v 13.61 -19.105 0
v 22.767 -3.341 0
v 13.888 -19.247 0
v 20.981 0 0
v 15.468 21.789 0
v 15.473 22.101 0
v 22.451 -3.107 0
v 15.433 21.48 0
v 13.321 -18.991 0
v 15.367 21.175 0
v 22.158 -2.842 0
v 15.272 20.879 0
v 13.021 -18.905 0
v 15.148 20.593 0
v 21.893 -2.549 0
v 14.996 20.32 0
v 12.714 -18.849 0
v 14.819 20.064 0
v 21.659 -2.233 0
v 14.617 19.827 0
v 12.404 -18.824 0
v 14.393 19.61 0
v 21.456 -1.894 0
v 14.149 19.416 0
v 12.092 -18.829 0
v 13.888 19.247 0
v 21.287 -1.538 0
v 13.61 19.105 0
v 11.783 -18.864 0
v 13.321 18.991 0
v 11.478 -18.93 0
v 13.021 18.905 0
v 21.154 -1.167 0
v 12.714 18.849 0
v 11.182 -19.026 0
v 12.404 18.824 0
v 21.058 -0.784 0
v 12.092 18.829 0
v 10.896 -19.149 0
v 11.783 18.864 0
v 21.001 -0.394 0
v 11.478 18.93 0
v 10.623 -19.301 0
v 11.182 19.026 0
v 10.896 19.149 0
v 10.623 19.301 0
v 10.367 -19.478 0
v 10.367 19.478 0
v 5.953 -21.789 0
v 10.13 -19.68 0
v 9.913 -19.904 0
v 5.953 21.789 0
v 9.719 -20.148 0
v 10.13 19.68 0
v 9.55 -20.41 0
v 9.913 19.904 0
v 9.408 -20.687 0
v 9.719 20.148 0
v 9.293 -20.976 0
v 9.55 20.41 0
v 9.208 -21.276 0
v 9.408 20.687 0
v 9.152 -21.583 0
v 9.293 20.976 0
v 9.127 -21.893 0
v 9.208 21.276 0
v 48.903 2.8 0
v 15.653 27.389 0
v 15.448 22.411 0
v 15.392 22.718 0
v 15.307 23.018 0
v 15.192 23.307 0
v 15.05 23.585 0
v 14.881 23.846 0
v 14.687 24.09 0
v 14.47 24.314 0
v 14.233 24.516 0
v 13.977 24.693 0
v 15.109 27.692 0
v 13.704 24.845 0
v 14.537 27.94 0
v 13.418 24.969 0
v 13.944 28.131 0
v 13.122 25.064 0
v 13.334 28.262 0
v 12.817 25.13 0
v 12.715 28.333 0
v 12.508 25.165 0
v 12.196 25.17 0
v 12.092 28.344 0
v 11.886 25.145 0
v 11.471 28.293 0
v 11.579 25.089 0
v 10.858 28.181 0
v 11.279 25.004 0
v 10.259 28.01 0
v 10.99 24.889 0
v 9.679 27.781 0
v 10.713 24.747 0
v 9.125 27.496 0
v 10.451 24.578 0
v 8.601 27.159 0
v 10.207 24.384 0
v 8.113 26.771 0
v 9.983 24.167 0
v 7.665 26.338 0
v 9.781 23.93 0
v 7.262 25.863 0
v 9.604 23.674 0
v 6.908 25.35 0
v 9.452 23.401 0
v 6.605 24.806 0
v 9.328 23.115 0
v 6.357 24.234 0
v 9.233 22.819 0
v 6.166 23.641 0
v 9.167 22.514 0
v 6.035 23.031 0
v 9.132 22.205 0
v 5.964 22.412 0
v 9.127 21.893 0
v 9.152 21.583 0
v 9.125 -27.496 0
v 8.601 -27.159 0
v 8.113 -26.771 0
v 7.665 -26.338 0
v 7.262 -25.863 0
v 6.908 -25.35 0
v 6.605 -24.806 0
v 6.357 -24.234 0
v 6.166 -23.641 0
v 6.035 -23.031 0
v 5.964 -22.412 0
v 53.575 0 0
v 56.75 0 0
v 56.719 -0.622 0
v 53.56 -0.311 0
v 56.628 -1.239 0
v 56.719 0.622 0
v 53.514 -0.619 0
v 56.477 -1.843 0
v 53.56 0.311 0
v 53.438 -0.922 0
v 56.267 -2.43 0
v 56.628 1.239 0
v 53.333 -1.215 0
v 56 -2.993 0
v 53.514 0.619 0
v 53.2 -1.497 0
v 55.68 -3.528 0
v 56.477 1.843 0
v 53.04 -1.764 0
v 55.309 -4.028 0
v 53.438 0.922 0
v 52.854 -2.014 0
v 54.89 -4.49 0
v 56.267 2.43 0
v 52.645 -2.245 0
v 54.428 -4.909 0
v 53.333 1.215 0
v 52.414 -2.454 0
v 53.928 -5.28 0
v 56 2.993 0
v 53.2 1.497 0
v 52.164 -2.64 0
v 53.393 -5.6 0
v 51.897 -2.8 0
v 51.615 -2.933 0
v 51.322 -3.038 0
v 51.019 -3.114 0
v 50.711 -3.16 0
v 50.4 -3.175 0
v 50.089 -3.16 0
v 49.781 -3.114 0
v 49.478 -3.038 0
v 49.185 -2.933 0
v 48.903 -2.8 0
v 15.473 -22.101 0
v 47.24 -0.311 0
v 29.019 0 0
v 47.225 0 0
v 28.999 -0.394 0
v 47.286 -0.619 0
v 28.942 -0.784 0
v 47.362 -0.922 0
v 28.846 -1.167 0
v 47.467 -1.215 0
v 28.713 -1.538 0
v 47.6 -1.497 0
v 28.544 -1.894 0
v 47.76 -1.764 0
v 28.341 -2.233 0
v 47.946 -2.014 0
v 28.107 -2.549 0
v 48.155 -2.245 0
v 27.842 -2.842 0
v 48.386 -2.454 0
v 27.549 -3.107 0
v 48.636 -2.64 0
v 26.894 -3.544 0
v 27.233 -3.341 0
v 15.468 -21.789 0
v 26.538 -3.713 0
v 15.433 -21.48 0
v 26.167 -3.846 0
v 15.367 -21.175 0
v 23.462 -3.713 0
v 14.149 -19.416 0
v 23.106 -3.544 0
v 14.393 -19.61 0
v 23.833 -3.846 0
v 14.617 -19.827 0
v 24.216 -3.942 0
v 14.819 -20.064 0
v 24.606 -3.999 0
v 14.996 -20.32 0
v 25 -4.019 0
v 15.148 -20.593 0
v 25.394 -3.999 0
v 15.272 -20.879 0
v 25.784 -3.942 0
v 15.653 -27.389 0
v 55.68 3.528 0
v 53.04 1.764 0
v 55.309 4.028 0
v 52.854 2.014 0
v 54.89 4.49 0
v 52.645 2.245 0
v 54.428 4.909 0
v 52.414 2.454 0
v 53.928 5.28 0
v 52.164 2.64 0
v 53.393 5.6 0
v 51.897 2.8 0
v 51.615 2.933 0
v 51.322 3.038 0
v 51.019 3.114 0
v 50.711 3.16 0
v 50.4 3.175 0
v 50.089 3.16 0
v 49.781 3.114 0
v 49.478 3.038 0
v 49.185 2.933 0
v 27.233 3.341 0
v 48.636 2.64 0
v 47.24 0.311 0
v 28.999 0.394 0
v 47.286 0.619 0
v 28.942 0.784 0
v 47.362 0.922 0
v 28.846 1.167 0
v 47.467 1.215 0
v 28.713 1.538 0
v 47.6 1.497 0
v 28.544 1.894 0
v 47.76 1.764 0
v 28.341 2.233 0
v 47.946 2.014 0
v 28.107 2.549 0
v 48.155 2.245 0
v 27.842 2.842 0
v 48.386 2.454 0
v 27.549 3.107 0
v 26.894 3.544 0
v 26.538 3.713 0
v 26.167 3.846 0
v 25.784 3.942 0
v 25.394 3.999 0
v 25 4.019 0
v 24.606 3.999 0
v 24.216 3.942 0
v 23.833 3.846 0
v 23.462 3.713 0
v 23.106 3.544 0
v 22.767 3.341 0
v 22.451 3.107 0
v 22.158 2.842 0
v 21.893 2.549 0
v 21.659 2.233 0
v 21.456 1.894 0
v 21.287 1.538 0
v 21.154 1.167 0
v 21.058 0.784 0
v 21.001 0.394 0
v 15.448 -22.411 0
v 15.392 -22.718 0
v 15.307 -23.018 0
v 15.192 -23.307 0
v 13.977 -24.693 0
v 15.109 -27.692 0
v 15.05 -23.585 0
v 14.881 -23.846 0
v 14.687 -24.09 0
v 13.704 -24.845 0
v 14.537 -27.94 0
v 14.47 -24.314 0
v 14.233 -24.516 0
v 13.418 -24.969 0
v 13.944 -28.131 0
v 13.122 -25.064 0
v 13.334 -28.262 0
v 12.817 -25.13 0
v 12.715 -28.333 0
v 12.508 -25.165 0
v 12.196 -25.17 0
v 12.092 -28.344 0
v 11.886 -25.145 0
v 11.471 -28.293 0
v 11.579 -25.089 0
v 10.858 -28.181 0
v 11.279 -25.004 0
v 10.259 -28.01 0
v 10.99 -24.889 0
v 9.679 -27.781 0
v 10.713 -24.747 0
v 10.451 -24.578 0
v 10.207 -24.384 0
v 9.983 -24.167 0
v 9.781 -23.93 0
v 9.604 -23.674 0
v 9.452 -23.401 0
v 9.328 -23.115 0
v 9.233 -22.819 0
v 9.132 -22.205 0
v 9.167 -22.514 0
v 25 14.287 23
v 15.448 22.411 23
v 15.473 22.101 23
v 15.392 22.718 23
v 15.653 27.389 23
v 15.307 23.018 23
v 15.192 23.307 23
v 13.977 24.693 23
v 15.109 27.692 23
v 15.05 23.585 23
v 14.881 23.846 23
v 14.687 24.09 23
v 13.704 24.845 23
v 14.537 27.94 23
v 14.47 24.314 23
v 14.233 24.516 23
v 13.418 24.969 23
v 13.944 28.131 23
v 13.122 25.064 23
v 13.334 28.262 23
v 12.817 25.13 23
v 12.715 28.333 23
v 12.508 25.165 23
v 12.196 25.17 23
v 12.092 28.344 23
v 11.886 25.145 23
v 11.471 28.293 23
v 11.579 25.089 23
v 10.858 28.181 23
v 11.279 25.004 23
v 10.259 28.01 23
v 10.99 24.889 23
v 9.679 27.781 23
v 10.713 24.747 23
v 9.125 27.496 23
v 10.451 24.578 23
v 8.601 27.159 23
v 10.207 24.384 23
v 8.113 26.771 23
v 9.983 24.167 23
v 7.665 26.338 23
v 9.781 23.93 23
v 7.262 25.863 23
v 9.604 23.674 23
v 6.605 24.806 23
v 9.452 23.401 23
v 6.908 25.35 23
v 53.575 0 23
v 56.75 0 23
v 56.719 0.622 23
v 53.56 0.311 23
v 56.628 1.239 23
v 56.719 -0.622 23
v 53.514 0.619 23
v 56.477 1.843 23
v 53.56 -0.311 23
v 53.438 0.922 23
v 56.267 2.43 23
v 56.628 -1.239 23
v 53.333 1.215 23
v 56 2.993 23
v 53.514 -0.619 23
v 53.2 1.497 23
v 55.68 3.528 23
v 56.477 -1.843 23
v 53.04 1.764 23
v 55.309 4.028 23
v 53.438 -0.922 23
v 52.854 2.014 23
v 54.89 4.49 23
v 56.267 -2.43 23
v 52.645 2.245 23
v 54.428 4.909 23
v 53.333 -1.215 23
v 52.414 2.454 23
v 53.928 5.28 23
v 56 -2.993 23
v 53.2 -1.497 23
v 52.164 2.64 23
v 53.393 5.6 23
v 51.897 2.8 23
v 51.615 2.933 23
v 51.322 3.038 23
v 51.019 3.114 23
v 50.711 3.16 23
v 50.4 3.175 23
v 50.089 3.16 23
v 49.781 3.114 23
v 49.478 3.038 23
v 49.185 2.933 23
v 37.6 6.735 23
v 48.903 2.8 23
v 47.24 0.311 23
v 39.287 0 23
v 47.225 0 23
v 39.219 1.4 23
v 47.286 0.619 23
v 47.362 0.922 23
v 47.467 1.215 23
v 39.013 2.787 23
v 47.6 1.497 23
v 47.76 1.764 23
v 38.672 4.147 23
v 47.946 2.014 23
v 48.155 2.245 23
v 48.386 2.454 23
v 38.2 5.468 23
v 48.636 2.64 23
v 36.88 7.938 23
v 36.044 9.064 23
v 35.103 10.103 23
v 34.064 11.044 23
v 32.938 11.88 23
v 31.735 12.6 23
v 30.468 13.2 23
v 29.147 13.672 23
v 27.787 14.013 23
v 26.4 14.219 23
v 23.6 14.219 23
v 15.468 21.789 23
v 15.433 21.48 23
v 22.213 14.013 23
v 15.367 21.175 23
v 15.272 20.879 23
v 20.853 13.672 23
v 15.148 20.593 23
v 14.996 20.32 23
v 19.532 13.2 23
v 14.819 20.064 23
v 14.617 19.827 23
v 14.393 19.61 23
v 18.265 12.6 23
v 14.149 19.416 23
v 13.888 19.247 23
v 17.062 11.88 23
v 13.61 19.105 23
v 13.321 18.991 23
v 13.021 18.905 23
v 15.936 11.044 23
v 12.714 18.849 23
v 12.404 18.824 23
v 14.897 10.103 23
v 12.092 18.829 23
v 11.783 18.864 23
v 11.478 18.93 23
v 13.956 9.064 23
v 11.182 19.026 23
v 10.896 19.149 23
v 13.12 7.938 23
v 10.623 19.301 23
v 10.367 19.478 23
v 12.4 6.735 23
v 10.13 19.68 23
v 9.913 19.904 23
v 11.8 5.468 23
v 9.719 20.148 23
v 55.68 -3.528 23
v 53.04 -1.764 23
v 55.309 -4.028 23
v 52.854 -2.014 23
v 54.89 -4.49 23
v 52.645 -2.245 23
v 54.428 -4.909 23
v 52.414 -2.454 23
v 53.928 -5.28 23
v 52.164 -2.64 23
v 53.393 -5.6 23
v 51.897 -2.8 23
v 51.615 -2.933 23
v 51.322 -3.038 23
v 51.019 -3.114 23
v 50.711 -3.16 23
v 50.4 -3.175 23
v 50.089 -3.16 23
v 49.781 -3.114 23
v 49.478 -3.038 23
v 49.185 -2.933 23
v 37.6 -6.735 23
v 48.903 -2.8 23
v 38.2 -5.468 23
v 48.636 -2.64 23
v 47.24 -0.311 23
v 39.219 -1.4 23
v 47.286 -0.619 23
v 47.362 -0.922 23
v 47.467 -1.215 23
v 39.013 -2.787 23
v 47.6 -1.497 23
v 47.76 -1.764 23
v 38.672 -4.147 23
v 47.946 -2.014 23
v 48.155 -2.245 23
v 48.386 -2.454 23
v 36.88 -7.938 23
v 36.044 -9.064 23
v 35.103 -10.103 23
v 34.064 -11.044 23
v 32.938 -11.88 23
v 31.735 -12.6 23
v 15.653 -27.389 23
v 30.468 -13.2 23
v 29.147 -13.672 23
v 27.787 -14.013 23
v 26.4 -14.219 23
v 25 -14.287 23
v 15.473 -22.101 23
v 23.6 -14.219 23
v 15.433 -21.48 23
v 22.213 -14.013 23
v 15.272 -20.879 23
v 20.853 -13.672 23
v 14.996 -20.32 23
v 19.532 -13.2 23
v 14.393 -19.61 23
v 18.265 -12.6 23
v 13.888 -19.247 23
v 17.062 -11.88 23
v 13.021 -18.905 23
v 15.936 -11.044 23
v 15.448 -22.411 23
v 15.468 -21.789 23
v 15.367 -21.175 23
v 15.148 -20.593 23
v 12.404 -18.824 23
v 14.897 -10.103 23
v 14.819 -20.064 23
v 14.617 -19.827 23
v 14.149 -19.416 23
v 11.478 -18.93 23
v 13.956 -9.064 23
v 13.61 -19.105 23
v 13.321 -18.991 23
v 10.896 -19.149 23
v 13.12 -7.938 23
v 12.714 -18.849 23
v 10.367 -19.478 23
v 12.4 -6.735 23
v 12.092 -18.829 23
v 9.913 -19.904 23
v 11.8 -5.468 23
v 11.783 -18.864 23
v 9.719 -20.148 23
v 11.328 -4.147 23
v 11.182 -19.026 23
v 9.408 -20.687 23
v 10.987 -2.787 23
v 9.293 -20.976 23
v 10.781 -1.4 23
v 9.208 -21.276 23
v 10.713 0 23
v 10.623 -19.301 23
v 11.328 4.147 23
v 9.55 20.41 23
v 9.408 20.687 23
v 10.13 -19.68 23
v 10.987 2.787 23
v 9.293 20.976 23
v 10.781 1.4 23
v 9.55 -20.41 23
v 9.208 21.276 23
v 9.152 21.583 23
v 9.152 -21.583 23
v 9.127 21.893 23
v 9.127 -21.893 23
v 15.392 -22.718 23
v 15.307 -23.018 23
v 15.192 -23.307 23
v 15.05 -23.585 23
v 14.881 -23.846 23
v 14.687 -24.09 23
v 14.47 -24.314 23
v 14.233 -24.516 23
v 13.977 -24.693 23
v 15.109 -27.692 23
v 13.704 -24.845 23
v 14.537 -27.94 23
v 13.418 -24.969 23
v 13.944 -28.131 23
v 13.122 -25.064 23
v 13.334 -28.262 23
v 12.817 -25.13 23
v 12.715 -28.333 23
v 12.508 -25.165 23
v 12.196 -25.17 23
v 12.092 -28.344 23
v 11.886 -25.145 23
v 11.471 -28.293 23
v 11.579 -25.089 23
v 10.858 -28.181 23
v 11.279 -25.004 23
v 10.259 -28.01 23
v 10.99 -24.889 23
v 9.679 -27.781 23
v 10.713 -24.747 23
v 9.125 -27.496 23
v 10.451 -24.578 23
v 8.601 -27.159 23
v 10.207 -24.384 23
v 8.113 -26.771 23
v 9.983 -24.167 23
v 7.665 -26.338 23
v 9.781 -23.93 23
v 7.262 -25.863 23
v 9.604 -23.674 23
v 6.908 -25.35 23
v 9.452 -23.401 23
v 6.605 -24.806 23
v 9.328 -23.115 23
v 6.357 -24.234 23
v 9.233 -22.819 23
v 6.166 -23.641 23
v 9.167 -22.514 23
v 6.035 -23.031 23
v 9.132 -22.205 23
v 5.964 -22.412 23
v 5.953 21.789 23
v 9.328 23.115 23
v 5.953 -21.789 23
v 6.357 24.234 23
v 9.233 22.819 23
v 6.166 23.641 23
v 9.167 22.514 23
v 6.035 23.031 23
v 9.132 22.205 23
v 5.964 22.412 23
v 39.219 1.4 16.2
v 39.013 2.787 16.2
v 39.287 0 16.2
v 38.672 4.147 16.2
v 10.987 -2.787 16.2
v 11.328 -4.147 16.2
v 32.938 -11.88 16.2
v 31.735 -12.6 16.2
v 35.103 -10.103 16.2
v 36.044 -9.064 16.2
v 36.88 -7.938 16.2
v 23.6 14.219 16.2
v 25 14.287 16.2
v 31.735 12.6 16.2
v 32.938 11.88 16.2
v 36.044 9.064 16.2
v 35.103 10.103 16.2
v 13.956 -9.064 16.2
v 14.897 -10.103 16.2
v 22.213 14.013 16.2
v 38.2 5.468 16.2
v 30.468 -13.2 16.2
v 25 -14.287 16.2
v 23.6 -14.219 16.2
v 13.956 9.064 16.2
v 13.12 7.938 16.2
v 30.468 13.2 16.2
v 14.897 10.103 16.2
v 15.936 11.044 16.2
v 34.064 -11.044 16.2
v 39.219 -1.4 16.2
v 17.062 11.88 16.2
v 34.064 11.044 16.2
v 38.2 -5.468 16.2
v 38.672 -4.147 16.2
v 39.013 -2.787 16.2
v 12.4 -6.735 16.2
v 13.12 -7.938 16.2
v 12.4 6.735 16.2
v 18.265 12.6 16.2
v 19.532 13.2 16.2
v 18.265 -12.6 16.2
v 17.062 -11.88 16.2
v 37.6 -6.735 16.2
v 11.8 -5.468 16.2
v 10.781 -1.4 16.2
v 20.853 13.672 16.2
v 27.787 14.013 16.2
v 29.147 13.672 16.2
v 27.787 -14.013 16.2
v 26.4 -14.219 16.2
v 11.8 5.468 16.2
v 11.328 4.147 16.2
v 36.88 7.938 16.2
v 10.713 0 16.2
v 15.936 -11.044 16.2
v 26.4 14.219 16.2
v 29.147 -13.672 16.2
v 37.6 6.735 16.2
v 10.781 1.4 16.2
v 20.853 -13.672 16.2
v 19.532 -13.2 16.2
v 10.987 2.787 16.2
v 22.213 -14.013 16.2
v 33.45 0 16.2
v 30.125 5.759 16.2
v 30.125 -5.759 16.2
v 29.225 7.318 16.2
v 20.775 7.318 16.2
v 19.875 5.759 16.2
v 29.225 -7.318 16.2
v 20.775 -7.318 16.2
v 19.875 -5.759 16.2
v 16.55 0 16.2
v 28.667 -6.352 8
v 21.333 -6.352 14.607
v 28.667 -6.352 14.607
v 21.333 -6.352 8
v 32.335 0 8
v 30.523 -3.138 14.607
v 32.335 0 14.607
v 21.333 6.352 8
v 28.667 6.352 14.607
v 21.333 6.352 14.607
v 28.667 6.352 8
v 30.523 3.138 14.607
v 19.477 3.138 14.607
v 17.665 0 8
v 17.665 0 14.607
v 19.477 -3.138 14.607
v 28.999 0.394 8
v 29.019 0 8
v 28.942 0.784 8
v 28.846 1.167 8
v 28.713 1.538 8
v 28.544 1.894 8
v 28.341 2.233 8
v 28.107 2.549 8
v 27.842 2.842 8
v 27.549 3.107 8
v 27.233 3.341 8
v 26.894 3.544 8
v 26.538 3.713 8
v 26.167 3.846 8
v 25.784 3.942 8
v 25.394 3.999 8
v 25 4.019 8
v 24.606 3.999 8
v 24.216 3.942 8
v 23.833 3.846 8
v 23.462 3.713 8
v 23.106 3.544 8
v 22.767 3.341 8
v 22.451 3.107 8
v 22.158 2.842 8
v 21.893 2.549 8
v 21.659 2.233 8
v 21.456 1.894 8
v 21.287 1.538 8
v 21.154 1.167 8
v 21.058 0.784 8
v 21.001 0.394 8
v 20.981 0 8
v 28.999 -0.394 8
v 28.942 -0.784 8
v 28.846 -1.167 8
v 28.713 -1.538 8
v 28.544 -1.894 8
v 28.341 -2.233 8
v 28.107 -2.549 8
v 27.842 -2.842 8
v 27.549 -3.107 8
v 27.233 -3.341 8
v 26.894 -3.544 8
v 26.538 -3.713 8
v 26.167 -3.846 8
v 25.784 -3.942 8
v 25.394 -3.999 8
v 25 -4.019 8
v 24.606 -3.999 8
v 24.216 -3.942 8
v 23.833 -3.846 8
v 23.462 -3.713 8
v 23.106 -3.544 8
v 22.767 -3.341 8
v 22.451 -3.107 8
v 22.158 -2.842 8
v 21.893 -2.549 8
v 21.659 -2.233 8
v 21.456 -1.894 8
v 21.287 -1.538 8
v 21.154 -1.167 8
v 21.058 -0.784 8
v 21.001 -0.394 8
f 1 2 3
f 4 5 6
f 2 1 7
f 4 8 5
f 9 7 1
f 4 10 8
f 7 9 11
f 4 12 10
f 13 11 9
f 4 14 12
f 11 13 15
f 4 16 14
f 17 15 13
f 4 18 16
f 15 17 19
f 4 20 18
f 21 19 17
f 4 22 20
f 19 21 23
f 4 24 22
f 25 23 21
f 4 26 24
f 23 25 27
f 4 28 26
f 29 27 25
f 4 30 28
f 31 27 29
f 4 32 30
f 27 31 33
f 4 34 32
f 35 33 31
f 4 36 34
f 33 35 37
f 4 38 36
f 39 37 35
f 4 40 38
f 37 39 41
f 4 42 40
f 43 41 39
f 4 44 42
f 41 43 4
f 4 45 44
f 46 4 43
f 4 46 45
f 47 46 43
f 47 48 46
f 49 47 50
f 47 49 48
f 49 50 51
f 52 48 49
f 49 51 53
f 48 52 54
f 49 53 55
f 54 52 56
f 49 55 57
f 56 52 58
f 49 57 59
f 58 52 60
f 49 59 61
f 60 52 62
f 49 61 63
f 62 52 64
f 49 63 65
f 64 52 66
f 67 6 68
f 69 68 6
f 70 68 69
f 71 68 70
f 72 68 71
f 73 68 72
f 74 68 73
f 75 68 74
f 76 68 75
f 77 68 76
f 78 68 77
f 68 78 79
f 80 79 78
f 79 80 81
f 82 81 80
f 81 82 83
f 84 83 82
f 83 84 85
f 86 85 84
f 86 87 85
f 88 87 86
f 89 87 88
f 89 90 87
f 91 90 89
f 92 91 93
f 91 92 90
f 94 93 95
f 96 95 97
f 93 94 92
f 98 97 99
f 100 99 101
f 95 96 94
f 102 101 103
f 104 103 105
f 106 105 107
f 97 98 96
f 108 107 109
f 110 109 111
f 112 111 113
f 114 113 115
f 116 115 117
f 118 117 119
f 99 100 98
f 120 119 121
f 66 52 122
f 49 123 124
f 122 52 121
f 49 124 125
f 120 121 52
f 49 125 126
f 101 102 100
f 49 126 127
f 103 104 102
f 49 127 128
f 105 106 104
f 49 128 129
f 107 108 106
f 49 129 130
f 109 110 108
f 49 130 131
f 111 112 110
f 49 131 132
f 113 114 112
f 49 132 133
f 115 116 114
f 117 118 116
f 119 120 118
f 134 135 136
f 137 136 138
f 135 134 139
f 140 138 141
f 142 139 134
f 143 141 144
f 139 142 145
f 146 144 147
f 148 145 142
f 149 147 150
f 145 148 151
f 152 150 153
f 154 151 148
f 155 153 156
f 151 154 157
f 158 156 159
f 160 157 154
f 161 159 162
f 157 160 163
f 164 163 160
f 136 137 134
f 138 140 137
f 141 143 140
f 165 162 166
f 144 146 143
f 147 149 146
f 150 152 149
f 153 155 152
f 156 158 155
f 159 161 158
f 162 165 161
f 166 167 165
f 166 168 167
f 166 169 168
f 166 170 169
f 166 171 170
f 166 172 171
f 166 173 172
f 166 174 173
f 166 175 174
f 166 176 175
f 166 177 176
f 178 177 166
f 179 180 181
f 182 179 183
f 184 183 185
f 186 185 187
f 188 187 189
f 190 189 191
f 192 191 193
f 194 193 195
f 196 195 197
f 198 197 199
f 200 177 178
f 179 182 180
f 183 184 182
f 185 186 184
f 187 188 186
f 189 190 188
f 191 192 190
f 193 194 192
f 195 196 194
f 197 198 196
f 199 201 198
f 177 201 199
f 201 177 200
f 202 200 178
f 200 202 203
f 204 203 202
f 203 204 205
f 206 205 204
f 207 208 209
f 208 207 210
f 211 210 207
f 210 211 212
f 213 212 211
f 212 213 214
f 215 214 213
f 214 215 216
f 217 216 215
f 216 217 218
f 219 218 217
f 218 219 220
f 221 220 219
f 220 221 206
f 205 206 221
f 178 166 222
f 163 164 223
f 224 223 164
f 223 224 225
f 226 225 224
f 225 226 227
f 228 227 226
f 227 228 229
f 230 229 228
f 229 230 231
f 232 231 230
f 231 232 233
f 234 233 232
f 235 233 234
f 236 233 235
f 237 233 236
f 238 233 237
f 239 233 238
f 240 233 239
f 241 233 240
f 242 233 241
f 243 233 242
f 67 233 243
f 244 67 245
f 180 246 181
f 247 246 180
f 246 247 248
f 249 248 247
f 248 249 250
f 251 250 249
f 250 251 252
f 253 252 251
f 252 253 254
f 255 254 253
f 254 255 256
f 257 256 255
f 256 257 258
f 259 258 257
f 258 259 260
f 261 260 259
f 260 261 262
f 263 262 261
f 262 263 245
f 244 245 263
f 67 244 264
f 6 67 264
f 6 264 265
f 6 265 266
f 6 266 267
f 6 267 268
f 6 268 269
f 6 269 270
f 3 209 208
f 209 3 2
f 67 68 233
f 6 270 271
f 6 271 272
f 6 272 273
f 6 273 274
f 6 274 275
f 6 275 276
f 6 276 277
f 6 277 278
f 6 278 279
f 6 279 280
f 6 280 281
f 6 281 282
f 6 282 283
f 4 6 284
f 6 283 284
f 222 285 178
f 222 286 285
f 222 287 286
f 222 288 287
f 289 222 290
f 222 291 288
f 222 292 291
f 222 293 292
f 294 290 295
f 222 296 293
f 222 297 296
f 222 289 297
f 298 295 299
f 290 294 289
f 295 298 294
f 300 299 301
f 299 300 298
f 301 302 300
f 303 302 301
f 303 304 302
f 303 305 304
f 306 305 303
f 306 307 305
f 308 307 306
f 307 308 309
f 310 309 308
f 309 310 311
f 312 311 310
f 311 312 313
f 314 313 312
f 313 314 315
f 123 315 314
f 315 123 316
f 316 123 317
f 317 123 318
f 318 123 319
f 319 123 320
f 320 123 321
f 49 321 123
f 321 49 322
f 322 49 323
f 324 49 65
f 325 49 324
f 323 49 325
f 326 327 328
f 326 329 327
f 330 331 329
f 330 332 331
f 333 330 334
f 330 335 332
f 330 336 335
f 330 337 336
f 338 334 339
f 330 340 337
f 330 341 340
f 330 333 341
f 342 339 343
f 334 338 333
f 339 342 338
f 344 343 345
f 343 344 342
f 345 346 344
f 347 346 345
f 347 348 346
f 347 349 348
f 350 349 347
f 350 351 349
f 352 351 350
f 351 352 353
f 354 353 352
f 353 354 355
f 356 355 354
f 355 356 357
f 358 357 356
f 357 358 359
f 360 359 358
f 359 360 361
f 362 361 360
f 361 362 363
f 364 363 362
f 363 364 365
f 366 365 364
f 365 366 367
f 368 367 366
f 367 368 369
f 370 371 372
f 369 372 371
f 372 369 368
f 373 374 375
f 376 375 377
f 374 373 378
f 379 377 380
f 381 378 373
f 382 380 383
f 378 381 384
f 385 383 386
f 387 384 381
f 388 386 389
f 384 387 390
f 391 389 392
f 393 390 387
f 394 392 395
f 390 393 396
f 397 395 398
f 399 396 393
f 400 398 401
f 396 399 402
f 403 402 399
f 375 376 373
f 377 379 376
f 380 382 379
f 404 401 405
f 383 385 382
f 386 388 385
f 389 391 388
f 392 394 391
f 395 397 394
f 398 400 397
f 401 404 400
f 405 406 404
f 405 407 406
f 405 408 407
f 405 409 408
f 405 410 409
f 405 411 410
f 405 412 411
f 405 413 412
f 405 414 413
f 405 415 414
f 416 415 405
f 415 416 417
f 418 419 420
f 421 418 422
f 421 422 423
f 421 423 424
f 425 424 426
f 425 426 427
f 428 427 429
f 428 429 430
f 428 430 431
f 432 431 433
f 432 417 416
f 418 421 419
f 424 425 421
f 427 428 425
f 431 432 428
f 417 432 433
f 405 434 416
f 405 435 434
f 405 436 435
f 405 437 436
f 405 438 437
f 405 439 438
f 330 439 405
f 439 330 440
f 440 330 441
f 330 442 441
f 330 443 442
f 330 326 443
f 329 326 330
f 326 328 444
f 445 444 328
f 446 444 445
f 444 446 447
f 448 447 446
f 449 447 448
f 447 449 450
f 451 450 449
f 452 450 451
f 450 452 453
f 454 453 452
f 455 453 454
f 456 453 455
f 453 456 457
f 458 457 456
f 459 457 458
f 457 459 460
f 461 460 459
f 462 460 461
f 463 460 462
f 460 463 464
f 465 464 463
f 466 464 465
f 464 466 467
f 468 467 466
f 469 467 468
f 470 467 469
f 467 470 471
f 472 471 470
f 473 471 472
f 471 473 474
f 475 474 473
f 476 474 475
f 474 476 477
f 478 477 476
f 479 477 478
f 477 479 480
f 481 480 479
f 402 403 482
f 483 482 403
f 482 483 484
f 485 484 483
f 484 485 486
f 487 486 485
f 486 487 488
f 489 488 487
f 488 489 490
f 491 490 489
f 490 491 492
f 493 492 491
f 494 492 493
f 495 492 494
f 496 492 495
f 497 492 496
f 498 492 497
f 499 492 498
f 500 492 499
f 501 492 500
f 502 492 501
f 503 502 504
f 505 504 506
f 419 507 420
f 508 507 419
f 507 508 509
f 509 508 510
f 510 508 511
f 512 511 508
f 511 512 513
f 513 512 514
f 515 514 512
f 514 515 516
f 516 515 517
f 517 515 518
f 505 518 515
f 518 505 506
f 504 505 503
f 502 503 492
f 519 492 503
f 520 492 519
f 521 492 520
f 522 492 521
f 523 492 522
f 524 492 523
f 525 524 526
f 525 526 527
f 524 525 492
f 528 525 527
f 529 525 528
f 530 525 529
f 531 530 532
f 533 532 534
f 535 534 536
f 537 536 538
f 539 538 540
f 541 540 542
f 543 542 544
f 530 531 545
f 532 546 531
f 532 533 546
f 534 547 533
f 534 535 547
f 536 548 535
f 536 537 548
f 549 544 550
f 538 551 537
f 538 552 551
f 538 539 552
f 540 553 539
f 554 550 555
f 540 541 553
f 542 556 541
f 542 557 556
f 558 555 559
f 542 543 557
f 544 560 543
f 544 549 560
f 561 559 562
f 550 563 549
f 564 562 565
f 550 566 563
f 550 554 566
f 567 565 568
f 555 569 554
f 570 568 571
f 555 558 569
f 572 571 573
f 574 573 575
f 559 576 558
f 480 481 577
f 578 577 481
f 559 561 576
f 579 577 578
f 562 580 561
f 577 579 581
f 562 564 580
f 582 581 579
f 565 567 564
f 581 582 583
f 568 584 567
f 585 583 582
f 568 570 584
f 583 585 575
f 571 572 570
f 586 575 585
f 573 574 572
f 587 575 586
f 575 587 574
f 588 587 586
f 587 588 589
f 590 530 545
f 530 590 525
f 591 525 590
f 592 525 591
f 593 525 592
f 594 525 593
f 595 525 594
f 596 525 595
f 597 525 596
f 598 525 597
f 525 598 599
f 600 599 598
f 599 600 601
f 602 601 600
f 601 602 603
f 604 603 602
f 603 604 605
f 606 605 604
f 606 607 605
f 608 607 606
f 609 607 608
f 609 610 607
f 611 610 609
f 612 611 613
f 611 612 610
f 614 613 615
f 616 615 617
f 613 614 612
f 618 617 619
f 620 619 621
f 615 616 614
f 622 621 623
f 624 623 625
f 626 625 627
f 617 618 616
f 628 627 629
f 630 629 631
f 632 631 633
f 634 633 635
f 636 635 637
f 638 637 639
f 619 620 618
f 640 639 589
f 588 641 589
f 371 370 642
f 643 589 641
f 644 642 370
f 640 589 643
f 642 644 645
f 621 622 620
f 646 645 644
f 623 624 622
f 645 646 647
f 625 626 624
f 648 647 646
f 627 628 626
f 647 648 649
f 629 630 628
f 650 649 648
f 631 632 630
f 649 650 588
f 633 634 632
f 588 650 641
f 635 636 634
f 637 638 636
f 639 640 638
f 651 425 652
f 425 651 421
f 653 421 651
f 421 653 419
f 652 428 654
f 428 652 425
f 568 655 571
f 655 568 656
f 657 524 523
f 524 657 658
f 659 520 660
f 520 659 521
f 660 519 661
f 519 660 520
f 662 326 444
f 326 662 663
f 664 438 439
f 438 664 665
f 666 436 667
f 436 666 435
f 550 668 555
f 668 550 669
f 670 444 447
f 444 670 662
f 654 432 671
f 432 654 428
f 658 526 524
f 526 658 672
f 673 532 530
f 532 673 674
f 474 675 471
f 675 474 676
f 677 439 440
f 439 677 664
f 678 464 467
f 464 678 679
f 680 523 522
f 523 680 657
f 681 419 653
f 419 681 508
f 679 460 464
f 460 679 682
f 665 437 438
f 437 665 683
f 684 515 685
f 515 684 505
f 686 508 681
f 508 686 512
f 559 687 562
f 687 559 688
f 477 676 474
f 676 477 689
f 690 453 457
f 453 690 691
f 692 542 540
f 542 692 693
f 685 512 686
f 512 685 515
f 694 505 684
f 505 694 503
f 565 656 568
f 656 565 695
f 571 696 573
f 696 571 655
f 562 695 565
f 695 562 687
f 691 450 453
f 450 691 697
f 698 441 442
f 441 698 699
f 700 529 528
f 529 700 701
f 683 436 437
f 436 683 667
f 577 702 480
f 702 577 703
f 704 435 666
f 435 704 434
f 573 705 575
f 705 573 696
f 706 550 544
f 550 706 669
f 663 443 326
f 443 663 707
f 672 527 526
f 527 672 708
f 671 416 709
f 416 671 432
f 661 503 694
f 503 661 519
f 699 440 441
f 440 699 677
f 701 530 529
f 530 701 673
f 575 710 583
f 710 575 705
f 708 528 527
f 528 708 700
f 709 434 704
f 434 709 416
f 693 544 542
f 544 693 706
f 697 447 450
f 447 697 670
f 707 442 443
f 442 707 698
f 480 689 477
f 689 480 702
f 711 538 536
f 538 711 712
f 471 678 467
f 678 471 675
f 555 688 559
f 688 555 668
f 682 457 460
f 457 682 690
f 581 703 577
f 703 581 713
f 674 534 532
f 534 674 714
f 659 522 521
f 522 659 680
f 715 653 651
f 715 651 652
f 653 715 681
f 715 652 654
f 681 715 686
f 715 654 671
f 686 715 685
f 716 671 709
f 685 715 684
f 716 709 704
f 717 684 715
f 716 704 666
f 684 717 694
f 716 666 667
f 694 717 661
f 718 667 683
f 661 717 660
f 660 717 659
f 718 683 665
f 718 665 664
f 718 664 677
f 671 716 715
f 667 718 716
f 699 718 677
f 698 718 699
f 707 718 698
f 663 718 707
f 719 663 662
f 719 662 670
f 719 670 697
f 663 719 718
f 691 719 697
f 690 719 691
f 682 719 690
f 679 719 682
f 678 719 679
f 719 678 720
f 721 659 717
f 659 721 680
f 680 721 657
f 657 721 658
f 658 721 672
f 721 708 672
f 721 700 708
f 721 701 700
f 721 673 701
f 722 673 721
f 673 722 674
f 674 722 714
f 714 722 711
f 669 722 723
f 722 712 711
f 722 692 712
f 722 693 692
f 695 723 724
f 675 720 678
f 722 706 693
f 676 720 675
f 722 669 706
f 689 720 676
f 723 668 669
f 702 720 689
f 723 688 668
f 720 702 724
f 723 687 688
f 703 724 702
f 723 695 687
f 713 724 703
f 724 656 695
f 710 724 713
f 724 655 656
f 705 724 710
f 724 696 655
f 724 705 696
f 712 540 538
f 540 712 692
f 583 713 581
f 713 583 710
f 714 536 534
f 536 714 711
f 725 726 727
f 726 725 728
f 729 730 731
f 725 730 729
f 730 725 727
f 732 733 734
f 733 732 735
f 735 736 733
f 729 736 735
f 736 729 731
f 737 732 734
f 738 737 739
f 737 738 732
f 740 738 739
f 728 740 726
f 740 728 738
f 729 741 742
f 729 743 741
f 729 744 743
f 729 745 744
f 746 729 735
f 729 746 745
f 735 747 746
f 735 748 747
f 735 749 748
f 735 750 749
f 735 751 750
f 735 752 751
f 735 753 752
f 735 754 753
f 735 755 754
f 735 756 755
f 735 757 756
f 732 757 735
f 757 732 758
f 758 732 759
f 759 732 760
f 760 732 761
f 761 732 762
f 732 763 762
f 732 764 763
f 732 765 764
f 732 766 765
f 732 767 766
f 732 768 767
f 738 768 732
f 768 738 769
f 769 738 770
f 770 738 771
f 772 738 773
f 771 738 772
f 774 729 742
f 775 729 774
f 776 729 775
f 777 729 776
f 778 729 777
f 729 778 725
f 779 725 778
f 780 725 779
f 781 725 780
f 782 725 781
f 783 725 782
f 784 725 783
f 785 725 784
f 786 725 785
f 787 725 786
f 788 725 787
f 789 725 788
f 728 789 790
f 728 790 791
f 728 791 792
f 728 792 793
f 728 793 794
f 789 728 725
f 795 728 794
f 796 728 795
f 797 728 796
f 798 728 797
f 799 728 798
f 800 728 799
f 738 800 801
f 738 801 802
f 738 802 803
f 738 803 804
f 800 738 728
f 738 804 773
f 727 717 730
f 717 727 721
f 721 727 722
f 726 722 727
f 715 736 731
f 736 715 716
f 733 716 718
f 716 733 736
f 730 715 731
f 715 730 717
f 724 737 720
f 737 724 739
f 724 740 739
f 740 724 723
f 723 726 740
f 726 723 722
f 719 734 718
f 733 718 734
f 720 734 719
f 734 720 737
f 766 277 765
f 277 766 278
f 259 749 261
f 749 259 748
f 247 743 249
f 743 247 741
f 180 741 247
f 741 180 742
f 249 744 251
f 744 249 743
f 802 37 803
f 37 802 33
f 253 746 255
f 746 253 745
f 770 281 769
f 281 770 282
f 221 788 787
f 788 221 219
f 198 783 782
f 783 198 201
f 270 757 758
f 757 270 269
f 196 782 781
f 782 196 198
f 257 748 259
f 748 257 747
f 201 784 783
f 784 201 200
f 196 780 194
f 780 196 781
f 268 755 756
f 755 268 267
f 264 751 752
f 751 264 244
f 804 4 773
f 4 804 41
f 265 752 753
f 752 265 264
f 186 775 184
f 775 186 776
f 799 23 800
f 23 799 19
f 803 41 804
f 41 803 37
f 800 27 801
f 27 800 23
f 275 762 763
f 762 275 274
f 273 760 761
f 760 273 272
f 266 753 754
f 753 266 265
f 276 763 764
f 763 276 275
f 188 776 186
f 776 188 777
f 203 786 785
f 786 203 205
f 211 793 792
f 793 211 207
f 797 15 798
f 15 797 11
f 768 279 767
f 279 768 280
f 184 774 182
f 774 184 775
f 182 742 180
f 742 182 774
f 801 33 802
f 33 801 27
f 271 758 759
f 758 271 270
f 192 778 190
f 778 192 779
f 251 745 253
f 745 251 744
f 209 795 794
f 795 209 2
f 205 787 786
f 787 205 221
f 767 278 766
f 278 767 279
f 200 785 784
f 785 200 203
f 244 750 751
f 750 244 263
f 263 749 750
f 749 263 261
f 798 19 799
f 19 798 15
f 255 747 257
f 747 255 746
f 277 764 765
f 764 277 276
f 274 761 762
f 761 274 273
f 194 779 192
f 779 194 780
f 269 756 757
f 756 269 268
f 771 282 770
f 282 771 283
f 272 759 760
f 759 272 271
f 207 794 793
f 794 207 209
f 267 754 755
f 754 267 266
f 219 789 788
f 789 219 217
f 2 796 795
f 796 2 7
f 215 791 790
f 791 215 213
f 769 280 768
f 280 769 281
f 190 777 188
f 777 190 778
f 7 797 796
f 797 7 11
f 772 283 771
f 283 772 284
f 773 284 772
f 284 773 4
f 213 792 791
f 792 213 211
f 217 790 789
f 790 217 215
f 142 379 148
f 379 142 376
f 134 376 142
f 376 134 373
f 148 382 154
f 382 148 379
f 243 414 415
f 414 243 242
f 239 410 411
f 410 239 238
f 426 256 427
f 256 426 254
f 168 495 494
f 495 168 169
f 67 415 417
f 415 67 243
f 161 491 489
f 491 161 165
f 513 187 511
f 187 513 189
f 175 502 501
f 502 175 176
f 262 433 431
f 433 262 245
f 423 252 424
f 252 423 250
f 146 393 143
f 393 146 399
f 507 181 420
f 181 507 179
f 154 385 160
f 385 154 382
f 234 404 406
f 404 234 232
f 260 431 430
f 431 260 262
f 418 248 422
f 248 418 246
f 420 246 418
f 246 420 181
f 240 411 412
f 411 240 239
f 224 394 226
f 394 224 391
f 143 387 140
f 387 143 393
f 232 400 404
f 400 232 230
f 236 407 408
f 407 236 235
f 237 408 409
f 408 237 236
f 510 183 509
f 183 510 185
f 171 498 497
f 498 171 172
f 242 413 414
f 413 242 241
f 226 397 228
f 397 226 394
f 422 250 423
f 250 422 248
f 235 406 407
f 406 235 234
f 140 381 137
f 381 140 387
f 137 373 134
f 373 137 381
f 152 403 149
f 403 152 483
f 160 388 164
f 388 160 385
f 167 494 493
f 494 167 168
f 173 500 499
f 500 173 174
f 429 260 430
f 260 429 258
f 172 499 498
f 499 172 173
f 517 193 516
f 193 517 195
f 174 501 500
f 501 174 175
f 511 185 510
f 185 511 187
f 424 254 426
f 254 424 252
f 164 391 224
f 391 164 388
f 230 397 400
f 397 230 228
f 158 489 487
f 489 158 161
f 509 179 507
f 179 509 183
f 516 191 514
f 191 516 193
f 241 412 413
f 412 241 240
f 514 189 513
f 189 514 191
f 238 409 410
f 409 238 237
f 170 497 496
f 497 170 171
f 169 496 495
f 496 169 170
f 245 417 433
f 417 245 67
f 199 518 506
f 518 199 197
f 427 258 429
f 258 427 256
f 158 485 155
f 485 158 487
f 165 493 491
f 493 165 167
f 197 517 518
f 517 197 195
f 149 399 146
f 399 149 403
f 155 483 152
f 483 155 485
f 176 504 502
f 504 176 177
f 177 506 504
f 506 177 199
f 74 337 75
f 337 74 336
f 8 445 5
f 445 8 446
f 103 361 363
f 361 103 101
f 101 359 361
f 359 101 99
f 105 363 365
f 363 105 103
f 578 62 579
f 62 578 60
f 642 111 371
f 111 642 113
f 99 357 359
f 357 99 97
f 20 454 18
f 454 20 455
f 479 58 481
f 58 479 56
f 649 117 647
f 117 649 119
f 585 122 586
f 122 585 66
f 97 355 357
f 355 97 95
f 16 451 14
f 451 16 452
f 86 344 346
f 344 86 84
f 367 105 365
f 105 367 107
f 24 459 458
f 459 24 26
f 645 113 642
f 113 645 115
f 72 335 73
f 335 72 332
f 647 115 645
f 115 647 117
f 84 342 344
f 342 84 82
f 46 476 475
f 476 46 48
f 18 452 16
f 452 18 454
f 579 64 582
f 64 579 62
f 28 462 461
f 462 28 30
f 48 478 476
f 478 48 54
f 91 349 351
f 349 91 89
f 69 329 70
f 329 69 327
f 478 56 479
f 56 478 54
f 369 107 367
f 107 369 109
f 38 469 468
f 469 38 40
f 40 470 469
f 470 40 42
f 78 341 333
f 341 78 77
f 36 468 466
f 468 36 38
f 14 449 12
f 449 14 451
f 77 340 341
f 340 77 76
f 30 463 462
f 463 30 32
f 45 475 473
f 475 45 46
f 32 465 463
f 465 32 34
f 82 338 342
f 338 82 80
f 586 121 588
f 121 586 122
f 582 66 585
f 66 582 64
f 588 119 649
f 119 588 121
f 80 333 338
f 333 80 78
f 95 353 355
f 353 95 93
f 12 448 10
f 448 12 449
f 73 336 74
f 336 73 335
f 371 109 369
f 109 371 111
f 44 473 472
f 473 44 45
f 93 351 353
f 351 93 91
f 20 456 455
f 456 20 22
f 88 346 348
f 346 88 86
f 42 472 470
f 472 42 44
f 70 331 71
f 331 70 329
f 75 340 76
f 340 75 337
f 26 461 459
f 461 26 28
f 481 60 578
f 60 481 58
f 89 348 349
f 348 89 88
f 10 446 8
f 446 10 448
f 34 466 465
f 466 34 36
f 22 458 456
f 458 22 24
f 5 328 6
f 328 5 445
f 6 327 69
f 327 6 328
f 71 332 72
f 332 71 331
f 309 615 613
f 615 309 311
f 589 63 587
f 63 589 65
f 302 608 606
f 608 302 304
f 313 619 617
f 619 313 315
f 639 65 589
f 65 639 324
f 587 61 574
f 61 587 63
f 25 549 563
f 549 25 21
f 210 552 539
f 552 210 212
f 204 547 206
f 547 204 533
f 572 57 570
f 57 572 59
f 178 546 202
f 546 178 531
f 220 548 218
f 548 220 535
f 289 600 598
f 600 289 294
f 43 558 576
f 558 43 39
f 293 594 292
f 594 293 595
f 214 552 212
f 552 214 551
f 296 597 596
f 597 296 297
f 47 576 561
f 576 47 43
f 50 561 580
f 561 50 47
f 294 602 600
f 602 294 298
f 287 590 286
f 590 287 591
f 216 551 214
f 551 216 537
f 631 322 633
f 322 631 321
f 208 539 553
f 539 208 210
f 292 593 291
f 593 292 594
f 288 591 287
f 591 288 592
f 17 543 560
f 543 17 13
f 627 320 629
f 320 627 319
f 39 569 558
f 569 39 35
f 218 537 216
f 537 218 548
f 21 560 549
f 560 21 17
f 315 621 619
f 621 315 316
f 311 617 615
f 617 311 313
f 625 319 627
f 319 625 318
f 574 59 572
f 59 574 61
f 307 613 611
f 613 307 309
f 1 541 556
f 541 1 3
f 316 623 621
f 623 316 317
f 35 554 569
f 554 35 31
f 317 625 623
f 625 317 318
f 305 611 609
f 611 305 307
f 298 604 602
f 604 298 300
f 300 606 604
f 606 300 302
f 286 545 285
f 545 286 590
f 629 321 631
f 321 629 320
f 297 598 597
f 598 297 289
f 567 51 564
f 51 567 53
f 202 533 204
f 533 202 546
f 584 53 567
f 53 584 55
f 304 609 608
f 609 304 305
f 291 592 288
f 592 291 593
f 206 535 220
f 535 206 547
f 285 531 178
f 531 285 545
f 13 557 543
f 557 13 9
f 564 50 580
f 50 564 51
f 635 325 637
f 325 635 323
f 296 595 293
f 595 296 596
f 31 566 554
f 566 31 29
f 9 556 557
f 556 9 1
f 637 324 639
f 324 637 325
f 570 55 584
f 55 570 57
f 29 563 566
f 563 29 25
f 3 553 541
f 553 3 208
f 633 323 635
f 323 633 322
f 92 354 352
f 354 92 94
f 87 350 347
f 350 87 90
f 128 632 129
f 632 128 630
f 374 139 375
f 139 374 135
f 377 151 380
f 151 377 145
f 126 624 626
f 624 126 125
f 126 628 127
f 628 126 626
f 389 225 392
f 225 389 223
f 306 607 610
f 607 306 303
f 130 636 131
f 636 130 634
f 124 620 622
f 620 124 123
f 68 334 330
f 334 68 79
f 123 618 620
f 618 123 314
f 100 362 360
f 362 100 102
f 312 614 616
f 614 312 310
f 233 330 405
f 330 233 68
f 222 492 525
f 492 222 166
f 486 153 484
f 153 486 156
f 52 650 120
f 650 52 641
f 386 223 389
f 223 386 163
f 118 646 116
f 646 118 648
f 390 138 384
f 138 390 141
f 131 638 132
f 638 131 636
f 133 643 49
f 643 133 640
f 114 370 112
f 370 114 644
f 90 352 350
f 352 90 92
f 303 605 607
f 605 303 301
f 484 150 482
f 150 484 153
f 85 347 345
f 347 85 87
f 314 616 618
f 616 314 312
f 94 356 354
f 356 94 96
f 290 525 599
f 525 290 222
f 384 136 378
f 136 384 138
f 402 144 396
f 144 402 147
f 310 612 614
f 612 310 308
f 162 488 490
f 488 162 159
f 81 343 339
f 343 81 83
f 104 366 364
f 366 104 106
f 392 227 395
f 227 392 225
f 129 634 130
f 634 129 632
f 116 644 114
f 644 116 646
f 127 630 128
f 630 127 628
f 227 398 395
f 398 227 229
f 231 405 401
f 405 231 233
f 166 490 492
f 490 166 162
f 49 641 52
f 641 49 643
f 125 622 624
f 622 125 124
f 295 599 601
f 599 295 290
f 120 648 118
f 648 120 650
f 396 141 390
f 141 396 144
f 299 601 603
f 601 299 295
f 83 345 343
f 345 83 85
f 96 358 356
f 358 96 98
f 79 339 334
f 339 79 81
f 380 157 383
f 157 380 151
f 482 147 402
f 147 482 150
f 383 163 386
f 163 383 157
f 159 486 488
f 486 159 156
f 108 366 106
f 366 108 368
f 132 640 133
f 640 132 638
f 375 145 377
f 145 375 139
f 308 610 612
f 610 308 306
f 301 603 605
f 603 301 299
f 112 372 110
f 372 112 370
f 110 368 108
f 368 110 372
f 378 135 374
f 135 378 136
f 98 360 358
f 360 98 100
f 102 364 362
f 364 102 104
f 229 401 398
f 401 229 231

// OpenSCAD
/*
 * 5/16" bolt or nut handle
 */

$inch = 25.4;

module bolt_chassis(height) {
    difference() {
        //cylinder(d=2*$inch, h=height, $fn=64);
        hull() {
            for (nub = [0:2]) {
                rotate(nub*120, [0,0,1]) {
                    translate([2*$inch / 2, 0,0]) {
                        cylinder(d=0.5*$inch, h=height, $fn=64);
                    }
                }
            }            
        }
        cylinder(d=1.35*$inch, h=height, $fn=64);
        for (bolthole = [0:2]) {
            rotate(bolthole*120, [0,0,1]) {
                translate([2*$inch / 2, 0,-1]) {
                    cylinder(d=1/4*$inch, h=height+2, $fn=64);
                }
            }
        }
    }
}

module top_body() {
    difference() {
        translate([0,0,0]) {
            cylinder(d=1.35*$inch, h=23, $fn=64);
        }
        translate([0,0,16.2]) {
            cylinder(d=1.125*$inch, h=10, $fn=64);
        }
        // hex head
        translate([0,0,8]) {
            cylinder(d=14.67, h=9, $fn=6);
        }
        // ease the edges of the hex hole
        translate([0,0,12.7]) {
            cylinder(d1=12, d2=19, h=5, $fn=6);
        }
        // bolt thru hole
        translate([0,0,-1]) {
            cylinder(d=(5/16*$inch+0.1), h=31, $fn=64);
        }
    }
}

translate([25,0,0]) {
    union() {
        top_body();
        bolt_chassis(23);
    }
}
